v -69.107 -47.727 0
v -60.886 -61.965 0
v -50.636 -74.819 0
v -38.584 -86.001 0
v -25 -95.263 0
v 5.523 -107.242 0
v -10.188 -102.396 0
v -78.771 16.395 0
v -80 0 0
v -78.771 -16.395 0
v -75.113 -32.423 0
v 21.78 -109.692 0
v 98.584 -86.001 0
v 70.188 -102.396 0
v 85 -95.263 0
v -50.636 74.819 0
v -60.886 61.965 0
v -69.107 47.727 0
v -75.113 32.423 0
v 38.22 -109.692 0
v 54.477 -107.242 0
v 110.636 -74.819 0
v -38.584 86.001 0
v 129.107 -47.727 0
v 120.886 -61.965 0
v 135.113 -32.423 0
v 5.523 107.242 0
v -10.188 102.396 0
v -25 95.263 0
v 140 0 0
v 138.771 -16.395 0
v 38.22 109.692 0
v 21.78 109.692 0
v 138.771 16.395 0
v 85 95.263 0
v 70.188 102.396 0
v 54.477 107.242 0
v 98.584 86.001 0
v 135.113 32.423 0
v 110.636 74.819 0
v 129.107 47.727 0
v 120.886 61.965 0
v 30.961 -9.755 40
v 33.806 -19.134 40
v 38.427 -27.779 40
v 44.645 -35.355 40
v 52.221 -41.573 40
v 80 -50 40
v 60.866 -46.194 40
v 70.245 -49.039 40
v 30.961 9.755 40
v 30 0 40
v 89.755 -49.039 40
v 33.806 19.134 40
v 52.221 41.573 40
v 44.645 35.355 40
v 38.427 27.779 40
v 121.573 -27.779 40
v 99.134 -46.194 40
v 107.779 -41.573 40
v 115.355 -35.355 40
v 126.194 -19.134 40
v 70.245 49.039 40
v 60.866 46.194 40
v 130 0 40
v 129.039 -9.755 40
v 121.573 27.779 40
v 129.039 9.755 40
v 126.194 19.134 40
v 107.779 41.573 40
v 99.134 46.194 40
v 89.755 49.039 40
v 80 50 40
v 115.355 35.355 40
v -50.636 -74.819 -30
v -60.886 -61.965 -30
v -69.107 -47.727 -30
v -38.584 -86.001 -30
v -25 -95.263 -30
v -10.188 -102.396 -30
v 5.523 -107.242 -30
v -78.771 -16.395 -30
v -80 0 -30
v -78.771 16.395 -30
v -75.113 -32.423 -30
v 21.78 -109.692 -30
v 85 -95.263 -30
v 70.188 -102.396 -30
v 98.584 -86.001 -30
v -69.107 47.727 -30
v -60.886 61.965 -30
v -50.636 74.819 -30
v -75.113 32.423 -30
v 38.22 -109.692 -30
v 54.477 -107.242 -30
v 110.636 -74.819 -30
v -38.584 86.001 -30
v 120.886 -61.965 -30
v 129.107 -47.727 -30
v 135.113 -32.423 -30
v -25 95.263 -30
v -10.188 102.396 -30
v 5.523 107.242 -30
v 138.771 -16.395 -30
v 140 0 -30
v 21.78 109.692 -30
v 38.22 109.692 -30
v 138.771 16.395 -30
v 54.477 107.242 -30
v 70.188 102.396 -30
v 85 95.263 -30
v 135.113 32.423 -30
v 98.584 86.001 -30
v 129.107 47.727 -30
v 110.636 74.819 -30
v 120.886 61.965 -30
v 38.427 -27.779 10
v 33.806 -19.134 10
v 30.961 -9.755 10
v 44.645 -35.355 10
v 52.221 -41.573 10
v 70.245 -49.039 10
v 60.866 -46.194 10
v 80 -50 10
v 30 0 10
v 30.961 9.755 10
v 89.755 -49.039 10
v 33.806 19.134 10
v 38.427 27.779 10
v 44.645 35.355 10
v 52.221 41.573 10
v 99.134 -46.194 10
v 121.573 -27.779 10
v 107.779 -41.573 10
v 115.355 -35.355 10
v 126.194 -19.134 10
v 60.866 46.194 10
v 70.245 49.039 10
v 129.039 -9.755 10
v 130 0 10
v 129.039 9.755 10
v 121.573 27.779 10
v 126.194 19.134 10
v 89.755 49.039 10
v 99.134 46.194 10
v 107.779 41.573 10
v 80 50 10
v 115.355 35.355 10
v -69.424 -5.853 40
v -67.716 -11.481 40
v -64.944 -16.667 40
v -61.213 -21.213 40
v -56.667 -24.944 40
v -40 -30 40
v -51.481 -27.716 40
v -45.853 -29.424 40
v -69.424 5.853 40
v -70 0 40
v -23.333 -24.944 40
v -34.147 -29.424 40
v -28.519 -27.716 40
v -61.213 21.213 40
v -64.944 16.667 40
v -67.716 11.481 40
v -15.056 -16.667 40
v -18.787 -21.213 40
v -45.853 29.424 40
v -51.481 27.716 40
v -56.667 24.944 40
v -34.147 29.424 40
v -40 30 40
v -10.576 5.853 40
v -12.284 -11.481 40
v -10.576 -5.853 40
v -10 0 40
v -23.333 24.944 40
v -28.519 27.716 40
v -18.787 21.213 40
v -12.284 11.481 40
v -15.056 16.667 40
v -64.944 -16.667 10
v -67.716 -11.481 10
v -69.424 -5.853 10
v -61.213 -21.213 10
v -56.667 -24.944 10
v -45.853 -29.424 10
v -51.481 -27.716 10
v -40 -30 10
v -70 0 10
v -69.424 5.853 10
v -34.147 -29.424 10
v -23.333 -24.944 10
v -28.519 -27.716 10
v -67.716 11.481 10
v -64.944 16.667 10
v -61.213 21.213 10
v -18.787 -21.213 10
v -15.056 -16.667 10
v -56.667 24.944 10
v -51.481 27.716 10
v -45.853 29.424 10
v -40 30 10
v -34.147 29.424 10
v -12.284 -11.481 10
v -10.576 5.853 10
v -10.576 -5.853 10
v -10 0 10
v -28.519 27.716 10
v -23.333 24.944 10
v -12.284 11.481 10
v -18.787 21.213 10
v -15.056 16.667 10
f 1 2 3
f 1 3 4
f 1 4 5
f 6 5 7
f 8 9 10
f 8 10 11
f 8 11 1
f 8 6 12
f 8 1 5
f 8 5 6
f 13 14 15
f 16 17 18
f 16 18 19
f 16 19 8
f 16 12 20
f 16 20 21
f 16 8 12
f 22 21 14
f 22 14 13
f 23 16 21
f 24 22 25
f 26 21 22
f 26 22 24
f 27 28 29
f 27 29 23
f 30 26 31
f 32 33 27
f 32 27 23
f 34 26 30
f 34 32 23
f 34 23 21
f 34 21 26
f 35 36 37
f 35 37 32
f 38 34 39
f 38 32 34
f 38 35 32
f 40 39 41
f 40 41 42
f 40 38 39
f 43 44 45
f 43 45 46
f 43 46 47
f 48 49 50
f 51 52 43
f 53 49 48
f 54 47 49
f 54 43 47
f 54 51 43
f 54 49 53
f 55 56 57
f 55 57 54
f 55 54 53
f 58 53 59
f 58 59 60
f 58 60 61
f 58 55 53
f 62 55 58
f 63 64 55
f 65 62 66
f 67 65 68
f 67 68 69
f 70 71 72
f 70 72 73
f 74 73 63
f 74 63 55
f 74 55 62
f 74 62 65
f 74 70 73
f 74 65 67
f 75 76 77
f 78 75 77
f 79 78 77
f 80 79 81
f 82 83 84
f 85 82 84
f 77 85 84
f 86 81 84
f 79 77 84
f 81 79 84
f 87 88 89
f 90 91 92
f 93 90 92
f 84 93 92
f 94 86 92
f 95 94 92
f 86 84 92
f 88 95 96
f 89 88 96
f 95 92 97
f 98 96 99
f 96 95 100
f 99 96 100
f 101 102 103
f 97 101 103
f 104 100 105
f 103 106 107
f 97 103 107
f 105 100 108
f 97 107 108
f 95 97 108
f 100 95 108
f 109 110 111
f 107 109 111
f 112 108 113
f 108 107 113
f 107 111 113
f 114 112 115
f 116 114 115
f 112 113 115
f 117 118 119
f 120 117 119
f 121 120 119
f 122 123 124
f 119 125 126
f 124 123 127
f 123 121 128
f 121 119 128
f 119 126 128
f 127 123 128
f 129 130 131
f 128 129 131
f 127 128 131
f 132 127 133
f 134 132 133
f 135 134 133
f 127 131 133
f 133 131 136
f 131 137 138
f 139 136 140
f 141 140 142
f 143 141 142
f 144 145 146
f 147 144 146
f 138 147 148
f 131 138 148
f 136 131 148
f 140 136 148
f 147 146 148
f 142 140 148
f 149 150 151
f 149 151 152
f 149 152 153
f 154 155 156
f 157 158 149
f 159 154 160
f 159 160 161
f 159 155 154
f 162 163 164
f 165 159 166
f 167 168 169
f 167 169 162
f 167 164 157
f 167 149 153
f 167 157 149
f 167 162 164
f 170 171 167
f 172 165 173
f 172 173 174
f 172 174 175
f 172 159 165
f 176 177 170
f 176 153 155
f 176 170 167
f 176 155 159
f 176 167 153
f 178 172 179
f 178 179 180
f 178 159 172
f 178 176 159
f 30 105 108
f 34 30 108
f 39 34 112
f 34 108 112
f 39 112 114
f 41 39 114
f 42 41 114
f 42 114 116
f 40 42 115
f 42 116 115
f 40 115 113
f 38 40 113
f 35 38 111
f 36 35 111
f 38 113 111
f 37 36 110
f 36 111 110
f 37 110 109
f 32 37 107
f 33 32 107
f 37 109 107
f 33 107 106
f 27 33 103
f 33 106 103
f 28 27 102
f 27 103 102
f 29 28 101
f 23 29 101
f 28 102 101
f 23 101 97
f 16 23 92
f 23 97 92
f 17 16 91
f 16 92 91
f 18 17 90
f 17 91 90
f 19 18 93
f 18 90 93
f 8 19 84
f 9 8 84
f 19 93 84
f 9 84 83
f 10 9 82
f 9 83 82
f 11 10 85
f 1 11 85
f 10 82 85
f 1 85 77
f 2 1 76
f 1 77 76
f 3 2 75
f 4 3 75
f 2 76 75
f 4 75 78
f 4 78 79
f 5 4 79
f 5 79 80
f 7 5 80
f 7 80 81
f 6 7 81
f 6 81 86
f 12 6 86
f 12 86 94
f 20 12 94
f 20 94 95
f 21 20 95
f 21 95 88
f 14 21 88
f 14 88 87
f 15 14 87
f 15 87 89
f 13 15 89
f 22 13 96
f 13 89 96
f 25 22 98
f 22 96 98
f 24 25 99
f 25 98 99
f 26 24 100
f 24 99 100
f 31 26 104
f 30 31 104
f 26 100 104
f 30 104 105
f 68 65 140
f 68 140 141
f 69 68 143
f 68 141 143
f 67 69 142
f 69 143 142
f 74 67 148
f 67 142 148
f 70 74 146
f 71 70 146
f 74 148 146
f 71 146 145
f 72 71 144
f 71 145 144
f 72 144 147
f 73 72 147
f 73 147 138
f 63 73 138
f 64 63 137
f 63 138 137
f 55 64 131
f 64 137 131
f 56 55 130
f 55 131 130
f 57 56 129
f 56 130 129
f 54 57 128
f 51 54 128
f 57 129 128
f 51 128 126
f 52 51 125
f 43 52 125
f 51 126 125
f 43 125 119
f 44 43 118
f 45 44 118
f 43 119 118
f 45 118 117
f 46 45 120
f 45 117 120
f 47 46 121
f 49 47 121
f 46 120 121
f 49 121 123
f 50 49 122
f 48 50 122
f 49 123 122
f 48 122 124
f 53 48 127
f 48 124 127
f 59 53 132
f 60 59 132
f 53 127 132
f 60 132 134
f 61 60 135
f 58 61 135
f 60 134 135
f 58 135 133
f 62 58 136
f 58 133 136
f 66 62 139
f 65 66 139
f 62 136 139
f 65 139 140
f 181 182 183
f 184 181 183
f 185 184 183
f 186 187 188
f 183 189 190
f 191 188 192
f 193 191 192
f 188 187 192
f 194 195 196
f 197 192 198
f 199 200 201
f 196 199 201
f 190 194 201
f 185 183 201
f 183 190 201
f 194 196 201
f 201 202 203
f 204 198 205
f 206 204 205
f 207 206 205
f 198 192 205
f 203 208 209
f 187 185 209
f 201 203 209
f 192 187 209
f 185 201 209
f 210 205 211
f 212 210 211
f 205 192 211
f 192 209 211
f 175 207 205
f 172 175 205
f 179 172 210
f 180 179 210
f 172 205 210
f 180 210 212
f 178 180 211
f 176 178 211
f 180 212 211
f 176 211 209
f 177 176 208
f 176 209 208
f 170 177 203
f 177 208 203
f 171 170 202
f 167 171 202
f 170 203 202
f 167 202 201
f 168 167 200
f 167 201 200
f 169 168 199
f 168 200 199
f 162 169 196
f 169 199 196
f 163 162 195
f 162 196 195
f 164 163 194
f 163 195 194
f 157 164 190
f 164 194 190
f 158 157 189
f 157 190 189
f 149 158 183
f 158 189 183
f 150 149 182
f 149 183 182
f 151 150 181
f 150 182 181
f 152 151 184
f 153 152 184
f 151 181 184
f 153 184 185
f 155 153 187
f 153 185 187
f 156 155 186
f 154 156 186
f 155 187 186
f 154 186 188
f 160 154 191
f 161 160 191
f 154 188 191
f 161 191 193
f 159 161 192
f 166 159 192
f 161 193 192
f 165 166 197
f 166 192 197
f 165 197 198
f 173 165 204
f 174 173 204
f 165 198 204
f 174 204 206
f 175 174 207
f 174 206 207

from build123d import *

# Parameters (mm, degrees)
CYLINDER_R        = 50
CYLINDER_DEPTH    = 30
CYLINDER001_R     = 30
CYLINDER001_DEPTH = 30
CYLINDER002_R     = 110
CYLINDER002_DEPTH = 30


with BuildPart() as cylinder:
    # Cylinder → Cylinder (new body)
    with BuildSketch(Plane(origin=(80, 0, 10), x_dir=(1, 0, 0), z_dir=(0, 0, 1))):
        Circle(CYLINDER_R)
    extrude(amount=CYLINDER_DEPTH)


with BuildPart() as cylinder001:
    # Cylinder001 → Cylinder001 (new body)
    with BuildSketch(Plane(origin=(-40, 0, 10), x_dir=(1, 0, 0), z_dir=(0, 0, 1))):
        Circle(CYLINDER001_R)
    extrude(amount=CYLINDER001_DEPTH)


with BuildPart() as cylinder002:
    # Cylinder002 → Cylinder002 (new body)
    with BuildSketch(Plane(origin=(30, 0, -30), x_dir=(1, 0, 0), z_dir=(0, 0, 1))):
        Circle(CYLINDER002_R)
    extrude(amount=CYLINDER002_DEPTH)


solid = Compound([cylinder.part, cylinder001.part, cylinder002.part])
